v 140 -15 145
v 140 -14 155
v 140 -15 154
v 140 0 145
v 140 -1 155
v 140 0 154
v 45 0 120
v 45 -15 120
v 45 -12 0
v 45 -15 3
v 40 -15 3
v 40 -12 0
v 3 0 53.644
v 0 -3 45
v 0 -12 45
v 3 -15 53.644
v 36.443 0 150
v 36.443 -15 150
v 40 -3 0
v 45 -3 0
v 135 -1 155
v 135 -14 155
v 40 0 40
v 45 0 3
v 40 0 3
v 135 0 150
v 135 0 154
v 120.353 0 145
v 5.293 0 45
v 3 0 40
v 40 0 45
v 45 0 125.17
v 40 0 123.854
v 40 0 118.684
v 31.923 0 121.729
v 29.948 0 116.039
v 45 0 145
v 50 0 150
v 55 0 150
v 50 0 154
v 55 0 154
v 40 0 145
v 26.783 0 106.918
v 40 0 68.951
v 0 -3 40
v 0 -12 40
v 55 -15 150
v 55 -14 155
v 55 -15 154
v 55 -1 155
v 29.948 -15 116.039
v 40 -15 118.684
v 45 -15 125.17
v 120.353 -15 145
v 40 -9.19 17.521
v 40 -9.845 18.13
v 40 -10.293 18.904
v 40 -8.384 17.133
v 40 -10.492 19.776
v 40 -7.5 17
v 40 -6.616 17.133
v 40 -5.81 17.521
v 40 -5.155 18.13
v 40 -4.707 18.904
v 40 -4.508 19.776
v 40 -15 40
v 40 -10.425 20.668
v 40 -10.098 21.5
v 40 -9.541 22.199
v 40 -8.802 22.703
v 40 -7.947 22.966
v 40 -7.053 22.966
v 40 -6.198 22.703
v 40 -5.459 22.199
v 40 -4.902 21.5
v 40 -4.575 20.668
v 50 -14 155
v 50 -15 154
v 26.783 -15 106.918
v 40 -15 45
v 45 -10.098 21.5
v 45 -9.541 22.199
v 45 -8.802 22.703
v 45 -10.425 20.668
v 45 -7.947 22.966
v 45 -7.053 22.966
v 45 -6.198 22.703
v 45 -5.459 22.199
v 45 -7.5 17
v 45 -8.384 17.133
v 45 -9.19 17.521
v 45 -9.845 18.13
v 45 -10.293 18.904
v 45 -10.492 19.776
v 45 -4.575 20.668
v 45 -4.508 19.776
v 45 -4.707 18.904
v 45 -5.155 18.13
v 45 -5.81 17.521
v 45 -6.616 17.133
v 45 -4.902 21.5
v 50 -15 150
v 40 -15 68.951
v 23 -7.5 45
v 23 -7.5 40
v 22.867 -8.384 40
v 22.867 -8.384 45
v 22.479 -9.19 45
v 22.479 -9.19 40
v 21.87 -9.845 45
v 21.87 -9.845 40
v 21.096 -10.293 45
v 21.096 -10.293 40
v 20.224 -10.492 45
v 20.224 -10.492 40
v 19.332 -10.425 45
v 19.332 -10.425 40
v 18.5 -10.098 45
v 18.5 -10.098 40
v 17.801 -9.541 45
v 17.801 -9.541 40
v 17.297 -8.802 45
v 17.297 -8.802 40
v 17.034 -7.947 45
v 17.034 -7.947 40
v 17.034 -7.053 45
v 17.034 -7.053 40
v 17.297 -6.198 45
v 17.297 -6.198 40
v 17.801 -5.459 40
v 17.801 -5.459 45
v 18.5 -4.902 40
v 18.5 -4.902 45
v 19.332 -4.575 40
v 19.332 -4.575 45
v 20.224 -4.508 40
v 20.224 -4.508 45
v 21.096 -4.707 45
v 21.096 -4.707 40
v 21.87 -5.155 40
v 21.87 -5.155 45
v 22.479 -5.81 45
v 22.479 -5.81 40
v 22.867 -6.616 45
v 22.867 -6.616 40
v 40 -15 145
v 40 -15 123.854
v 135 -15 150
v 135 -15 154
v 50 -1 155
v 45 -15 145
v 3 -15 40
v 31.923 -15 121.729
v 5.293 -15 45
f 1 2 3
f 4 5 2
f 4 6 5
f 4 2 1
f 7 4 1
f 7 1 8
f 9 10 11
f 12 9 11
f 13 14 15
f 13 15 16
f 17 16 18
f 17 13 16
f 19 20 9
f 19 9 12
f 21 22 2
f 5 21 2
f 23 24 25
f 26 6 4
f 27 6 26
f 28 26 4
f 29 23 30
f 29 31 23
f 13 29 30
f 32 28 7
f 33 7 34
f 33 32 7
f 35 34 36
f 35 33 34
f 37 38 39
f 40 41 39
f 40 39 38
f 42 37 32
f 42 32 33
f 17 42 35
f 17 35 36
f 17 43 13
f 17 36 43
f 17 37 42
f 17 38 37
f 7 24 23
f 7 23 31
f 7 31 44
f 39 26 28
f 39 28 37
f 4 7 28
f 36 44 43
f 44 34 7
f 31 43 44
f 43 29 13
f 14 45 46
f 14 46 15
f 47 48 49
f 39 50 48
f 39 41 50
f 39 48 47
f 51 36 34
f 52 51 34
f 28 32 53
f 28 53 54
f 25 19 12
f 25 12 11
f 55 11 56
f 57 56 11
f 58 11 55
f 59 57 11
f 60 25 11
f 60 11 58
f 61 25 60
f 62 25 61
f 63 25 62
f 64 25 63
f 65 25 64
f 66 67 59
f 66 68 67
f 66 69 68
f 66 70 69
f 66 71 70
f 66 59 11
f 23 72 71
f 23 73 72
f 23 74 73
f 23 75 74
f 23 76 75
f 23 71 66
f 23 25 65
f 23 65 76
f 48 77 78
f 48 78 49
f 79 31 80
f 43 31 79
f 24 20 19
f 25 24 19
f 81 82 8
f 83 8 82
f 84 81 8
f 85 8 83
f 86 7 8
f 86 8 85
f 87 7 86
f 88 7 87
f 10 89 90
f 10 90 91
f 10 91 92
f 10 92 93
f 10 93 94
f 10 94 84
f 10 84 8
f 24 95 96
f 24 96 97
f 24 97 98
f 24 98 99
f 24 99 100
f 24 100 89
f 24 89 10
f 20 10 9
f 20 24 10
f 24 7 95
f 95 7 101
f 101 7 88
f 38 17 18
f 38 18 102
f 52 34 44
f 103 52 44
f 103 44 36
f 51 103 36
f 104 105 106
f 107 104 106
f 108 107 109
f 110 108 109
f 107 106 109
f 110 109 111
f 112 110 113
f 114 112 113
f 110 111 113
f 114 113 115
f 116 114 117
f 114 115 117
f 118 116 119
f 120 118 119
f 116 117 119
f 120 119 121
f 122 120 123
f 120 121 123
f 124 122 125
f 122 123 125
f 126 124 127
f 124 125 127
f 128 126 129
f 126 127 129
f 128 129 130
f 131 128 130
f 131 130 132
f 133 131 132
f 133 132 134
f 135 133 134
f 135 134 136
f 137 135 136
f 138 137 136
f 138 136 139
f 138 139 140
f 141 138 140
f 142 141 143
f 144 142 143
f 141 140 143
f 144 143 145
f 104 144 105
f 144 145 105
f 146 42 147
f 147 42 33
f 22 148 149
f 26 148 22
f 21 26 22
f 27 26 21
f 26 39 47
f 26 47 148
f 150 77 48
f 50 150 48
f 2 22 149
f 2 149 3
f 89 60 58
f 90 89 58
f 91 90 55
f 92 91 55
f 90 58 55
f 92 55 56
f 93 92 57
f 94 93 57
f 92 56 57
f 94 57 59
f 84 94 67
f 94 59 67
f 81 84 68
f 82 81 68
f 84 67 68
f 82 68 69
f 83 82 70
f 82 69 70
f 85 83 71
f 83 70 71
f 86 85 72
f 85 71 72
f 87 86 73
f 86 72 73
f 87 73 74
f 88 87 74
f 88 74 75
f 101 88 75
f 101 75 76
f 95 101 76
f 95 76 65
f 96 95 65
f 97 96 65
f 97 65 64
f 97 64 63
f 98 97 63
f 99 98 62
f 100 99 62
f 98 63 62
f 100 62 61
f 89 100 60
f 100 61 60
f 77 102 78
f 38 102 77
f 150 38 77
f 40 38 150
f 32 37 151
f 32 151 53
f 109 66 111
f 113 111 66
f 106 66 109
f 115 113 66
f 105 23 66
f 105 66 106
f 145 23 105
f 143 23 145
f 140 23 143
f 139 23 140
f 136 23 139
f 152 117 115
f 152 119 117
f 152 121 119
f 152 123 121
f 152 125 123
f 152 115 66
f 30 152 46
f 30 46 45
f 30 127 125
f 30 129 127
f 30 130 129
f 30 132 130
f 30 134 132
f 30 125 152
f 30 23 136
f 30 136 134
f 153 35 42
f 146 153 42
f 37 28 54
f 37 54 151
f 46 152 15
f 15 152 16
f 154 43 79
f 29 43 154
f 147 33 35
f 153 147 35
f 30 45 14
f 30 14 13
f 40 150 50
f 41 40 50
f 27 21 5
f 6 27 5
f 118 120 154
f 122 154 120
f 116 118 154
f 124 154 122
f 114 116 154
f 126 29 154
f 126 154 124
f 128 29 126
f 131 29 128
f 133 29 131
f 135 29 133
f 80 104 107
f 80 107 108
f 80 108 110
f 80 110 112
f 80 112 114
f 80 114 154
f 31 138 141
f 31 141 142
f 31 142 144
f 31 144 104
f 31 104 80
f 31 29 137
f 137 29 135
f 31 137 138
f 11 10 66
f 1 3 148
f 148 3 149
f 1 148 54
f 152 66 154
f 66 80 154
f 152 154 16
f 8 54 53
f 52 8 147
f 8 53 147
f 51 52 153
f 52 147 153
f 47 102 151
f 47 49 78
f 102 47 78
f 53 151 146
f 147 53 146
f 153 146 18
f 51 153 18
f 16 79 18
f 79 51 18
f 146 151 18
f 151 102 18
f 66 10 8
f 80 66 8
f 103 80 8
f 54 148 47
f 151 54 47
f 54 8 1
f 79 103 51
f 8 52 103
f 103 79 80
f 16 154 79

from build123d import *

# Parameters (mm, degrees)
PAD_DEPTH       = 15
SKETCH001_R     = 3
POCKET_DEPTH    = 5
SKETCH002_R     = 3
POCKET001_DEPTH = 5
CHAMFER_SIZE    = 1
CHAMFER001_SIZE = 3


with BuildPart() as part:
    # Sketch → Pad (new body)
    with BuildSketch(Plane.XZ):
        Polygon((40, 0), (40, 40), (0, 40), (0, 45), (36.44278, 150), (50, 150), (50, 155), (55, 155), (55, 150), (135, 150), (135, 155), (140, 155), (140, 145), (45, 120), (45, 0), align=None)
        Polygon((45, 145), (45, 125.170232), (120.353117, 145), align=None, mode=Mode.SUBTRACT)
        Polygon((40, 45), (26.782752, 106.918082), (5.29259, 45), align=None, mode=Mode.SUBTRACT)
        Polygon((40, 68.950927), (29.948406, 116.039054), (40, 118.684211), align=None, mode=Mode.SUBTRACT)
        Polygon((40, 123.854443), (31.923231, 121.728977), (40, 145), align=None, mode=Mode.SUBTRACT)
    extrude(amount=PAD_DEPTH)

    # Sketch001 (on Face2 of Pad) → Pocket (cut)
    with BuildSketch(Plane(origin=(0, 0, 40), x_dir=(1, 0, 0), z_dir=(0, 0, -1))):
        with Locations((20, 7.5)):
            Circle(SKETCH001_R)
    extrude(amount=-POCKET_DEPTH, mode=Mode.SUBTRACT)

    # Sketch002 (on Face1 of Pocket) → Pocket001 (cut)
    with BuildSketch(Plane(origin=(40, 0, 0), x_dir=(0, 0, -1), z_dir=(-1, 0, 0))):
        with Locations((-20, 7.5)):
            Circle(SKETCH002_R)
    extrude(amount=-POCKET001_DEPTH, mode=Mode.SUBTRACT)

    # Chamfer
    chamfer_edges = [part.edges().sort_by_distance(p)[0] for p in [
        (137.5, -15, 155),
        (137.5, 0, 155),
        (52.5, -15, 155),
        (52.5, 0, 155),
    ]]
    chamfer(chamfer_edges, length=CHAMFER_SIZE)

    # Chamfer001
    chamfer001_edges = [part.edges().sort_by_distance(p)[0] for p in [
        (42.5, -15, 0),
        (42.5, 0, 0),
        (0, -15, 42.5),
        (0, 0, 42.5),
    ]]
    chamfer(chamfer001_edges, length=CHAMFER001_SIZE)


solid = part.part
